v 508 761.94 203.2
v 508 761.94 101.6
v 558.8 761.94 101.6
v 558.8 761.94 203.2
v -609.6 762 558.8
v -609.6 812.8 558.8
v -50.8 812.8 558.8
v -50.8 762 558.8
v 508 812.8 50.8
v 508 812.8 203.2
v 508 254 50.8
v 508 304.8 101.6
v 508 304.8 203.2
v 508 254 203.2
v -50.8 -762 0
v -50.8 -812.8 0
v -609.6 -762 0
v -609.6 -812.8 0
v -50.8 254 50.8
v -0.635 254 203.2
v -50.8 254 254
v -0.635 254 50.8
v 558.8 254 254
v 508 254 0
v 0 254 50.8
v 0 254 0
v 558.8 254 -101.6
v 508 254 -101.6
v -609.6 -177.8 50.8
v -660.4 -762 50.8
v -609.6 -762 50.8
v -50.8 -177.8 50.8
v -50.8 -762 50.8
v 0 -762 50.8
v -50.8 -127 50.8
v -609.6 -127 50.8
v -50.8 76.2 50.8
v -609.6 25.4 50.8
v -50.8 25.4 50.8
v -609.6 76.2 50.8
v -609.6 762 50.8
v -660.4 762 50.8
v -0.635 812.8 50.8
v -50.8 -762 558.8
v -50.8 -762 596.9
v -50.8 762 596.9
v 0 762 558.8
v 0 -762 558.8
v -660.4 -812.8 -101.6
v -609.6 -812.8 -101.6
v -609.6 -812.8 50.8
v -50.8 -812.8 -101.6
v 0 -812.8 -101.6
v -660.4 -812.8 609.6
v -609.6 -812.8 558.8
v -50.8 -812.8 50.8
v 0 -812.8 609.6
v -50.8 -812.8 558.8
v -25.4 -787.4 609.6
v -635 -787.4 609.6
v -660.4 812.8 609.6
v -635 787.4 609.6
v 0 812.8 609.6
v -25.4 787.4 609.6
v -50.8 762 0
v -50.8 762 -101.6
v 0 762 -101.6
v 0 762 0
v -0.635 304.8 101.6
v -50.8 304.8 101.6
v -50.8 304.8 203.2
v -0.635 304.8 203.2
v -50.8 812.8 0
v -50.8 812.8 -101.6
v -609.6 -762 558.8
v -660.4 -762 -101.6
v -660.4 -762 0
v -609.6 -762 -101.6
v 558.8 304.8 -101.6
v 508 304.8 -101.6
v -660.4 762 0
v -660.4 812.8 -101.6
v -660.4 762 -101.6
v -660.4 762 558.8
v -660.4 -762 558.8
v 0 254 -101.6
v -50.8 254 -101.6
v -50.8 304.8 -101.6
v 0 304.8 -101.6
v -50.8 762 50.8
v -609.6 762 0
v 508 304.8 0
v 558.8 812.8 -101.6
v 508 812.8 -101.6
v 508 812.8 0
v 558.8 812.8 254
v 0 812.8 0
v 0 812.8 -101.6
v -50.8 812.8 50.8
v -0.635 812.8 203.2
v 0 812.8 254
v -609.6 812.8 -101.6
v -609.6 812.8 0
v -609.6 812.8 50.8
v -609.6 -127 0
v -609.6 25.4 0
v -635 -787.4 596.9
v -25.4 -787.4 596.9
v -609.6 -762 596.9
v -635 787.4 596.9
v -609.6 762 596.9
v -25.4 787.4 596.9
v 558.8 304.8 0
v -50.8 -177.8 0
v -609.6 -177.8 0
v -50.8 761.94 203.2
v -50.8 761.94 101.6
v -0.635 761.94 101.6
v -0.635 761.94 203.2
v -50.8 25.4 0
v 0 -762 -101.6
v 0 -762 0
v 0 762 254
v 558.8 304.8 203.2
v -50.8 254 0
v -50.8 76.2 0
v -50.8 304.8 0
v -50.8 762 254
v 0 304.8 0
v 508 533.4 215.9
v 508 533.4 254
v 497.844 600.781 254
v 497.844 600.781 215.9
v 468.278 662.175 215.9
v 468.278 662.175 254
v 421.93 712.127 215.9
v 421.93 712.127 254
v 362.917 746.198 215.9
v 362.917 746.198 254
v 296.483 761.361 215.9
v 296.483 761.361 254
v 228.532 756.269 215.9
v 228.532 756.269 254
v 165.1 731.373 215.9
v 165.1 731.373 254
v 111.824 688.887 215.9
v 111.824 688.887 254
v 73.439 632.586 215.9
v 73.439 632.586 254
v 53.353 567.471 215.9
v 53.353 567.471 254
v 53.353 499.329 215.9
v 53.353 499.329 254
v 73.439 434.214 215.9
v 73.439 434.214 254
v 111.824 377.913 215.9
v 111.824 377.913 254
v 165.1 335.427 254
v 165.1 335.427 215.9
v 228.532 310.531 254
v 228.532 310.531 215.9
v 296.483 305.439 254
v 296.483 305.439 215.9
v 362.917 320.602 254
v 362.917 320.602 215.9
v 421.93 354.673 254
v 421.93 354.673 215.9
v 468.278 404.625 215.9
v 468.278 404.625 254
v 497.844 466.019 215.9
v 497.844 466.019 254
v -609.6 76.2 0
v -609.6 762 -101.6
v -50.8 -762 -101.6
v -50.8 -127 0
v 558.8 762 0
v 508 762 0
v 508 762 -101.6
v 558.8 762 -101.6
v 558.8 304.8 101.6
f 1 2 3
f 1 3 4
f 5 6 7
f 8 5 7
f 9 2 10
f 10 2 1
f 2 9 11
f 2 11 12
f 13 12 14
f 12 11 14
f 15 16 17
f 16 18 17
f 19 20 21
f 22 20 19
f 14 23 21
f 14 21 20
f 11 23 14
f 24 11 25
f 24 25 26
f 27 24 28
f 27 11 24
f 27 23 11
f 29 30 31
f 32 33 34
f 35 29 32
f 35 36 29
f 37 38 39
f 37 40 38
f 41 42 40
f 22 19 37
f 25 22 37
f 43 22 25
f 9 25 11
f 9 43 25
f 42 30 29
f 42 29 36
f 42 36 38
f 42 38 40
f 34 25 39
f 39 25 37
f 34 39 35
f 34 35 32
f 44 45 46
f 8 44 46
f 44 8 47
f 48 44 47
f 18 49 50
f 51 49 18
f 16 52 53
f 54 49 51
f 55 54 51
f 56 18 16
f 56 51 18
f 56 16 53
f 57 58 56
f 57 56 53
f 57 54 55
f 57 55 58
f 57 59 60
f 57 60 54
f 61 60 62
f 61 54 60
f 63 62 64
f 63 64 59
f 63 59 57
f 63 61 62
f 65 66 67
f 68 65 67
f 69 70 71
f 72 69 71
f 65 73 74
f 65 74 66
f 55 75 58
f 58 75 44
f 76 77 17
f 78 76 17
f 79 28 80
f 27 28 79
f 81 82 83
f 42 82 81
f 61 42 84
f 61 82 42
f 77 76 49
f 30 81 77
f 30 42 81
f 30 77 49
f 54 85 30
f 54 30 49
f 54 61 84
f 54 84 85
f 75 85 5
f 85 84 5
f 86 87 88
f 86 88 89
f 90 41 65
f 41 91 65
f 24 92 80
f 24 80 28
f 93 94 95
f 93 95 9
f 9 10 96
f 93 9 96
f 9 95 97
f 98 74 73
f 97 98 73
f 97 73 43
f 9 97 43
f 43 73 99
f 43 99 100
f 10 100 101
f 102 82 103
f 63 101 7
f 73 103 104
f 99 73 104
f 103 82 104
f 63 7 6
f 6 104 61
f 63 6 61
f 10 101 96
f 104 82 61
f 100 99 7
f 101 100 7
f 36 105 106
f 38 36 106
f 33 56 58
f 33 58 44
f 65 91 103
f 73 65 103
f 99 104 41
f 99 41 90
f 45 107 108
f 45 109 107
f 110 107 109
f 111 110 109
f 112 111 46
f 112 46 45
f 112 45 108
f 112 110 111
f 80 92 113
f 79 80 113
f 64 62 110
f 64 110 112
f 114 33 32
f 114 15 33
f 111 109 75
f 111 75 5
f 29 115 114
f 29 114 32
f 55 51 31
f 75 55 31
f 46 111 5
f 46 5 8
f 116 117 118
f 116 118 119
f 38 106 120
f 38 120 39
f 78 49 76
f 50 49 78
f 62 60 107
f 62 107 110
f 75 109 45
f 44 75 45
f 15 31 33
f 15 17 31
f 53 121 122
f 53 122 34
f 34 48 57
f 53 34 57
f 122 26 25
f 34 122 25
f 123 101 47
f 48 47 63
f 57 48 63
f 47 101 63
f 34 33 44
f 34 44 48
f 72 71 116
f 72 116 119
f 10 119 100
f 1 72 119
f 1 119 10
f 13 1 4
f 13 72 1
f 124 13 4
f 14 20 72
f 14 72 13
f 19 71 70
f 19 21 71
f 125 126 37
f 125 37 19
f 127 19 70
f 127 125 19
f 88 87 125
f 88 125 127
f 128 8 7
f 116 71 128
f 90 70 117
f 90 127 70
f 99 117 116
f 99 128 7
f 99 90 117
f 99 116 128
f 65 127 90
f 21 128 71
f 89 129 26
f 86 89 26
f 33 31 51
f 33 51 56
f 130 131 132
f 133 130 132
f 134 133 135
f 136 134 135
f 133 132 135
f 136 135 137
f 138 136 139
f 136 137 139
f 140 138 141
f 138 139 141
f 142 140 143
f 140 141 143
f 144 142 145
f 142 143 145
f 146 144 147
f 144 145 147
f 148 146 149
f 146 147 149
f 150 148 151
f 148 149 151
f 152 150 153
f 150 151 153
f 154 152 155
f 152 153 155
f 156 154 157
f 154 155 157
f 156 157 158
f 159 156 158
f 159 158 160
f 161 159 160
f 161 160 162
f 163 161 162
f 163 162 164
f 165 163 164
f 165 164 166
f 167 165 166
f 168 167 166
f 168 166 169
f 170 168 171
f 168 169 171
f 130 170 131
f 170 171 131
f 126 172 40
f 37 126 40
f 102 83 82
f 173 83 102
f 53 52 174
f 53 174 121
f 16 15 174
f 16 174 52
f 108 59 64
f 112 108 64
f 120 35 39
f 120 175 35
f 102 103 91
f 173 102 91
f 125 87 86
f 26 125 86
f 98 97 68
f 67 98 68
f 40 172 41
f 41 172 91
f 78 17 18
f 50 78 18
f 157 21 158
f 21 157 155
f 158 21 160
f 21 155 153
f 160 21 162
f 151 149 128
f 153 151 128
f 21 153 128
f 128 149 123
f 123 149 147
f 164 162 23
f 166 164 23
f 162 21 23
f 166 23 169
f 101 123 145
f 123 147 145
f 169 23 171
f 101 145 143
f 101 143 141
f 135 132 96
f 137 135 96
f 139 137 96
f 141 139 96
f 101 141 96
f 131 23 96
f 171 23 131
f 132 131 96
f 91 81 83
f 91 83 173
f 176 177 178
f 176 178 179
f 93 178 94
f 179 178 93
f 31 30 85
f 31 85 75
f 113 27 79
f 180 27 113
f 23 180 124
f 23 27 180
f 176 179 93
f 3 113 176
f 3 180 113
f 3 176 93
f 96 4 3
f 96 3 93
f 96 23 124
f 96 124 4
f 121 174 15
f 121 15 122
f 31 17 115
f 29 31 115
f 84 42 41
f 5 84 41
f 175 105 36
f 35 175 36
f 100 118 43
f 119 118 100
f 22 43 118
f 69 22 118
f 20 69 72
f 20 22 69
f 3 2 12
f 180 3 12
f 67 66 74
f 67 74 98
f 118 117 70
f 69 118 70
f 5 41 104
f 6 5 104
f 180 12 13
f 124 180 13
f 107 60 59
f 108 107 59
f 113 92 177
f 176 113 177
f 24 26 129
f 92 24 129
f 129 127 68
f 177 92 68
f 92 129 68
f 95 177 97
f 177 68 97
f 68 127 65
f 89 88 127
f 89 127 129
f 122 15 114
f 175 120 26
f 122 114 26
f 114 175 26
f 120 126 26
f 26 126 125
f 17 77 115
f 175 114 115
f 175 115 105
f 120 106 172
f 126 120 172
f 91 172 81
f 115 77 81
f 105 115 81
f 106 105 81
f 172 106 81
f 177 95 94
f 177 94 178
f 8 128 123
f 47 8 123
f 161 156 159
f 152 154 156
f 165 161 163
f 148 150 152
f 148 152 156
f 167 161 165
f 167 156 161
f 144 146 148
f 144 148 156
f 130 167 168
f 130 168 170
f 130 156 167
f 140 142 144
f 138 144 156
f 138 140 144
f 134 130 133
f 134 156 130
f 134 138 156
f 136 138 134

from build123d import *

# Parameters (mm, degrees)
F0_W       = 1320.8
F0_H       = 1625.6
F0_W_2     = 1219.2
F0_H_2     = 1524
F1_DEPTH   = 50.8
F2_W       = 50.8
F2_H       = 50.8
F3_DEPTH   = 508
F4_W       = 1320.8
F4_H       = 1625.6
F4_W_2     = 1219.2
F4_H_2     = 1524
F5_DEPTH   = 50.8
F6_W       = 609.6
F6_H       = 50.8
F7_DEPTH   = 1524
F9_DEPTH   = 609.601
F10_W      = 50.8
F10_H      = 50.8
F11_DEPTH  = 508
F12_W      = 50.8
F12_H      = 50.8
F13_DEPTH  = 1524
F14_W      = 558.8
F14_H      = 254
F15_DEPTH  = 558.8
F15_FACE_W = 508
F15_FACE_H = 203.2
F16_DEPTH  = 50.8
F17_W      = 508.634997
F17_H      = 152.4
F18_DEPTH  = 558.801
F19_W      = 457.139586
F19_H      = 101.6
F20_DEPTH  = 609.601
F21_W      = 609.6
F21_H      = 1574.8
F22_DEPTH  = 12.7
F23_W      = 558.8
F23_H      = 1524
F24_DEPTH  = 596.901
F25_W      = 50.8
F25_H      = 50.8
F26_DEPTH  = 101.6
F27_W      = 50.8
F27_H      = 50.8
F28_DEPTH  = 558.8
F29_R      = 228.6
F30_DEPTH  = 38.1


with BuildPart() as f1:
    # F0 (on Top) → F1 (new body)
    with BuildSketch(Plane.XY):
        Rectangle(F0_W, F0_H)
        Rectangle(F0_W_2, F0_H_2, mode=Mode.SUBTRACT)
    extrude(amount=F1_DEPTH)

    # F2 (on face) → F3 (join)
    with BuildSketch(Plane.XY.offset(50.8)):
        with Locations((-635, 787.4)):
            Rectangle(F2_W, F2_H)
        with Locations((635, 787.4)):
            Rectangle(F2_W, F2_H)
        with Locations((635, -787.4)):
            Rectangle(F2_W, F2_H)
        with Locations((-635, -787.4)):
            Rectangle(F2_W, F2_H)
    extrude(amount=F3_DEPTH)

    # F4 (on face) → F5 (join)
    with BuildSketch(Plane.XY.offset(558.8)):
        Rectangle(F4_W, F4_H)
        Rectangle(F4_W_2, F4_H_2, mode=Mode.SUBTRACT)
    extrude(amount=F5_DEPTH)

    # F6 (on face) → F7 (join, through all)
    with BuildSketch(Plane.XZ.offset(-762)):
        with Locations((-304.8, 584.2)):
            Rectangle(F6_W, F6_H)
    extrude(amount=F7_DEPTH)

    # F8 (on face) → F9 (cut, through all)
    with BuildSketch(Plane.XY.offset(609.6)):
        Polygon((0, 812.8), (0, 762), (0, -812.8), (660.4, -812.8), (660.4, 812.8), align=None)
    extrude(amount=-F9_DEPTH, mode=Mode.SUBTRACT)

    # F10 (on face) → F11 (join, through all)
    with BuildSketch(Plane.XY.offset(50.8)):
        with Locations((-25.4, 787.4)):
            Rectangle(F10_W, F10_H)
        with Locations((-25.4, -787.4)):
            Rectangle(F10_W, F10_H)
    extrude(amount=F11_DEPTH)

    # F12 (on face) → F13 (join, through all)
    with BuildSketch(Plane.XZ.offset(-762)):
        with Locations((-25.4, 25.4)):
            Rectangle(F12_W, F12_H)
    extrude(amount=F13_DEPTH)

    # F14 (on face) → F15 (join)
    with BuildSketch(Plane.YZ):
        with Locations((533.4, 127)):
            Rectangle(F14_W, F14_H)
    extrude(amount=F15_DEPTH)

    # F15_face (on face) → F16 (join)
    with BuildSketch(Plane(origin=(0, 508, 152.4), x_dir=(0, 1, 0), z_dir=(-1, 0, 0))):
        Rectangle(F15_FACE_W, F15_FACE_H)
    extrude(amount=F16_DEPTH)

    # F17 (on face) → F18 (cut, through all)
    with BuildSketch(Plane.XZ.offset(-254)):
        with Locations((253.682502, 127)):
            Rectangle(F17_W, F17_H)
    extrude(amount=-F18_DEPTH, mode=Mode.SUBTRACT)

    # F19 (on face) → F20 (cut, through all)
    with BuildSketch(Plane(origin=(-50.8, 0, 0), x_dir=(0, -1, 0), z_dir=(-1, 0, 0))):
        with Locations((-533.369793, 152.4)):
            Rectangle(F19_W, F19_H)
    extrude(amount=-F20_DEPTH, mode=Mode.SUBTRACT)

    # F21 (on face) → F22 (cut)
    with BuildSketch(Plane.XY.offset(609.6)):
        with Locations((-330.2, 0)):
            Rectangle(F21_W, F21_H)
    extrude(amount=-F22_DEPTH, mode=Mode.SUBTRACT)

    # F23 (on face) → F24 (cut, through all)
    with BuildSketch(Plane.XY.offset(596.9)):
        with Locations((-330.2, 0)):
            Rectangle(F23_W, F23_H)
    extrude(amount=-F24_DEPTH, mode=Mode.SUBTRACT)

    # F25 (on face) → F26 (join)
    with BuildSketch(Plane(origin=(0, 0, 0), x_dir=(1, 0, 0), z_dir=(0, 0, -1))):
        with Locations((-635, 787.4)):
            Rectangle(F25_W, F25_H)
        with Locations((-25.4, 787.4)):
            Rectangle(F25_W, F25_H)
        with Locations((-635, -787.4)):
            Rectangle(F25_W, F25_H)
        with Locations((-25.4, -787.4)):
            Rectangle(F25_W, F25_H)
        with Locations((-25.4, -279.4)):
            Rectangle(F25_W, F25_H)
        with Locations((533.4, -279.4)):
            Rectangle(F25_W, F25_H)
        with Locations((533.4, -787.4)):
            Rectangle(F25_W, F25_H)
    extrude(amount=F26_DEPTH)

    # F27 (on face) → F28 (join, through all)
    with BuildSketch(Plane.YZ.offset(-609.6)):
        with Locations((-152.4, 25.4)):
            Rectangle(F27_W, F27_H)
        with Locations((50.8, 25.4)):
            Rectangle(F27_W, F27_H)
    extrude(amount=F28_DEPTH)

    # F29 (on face) → F30 (cut)
    with BuildSketch(Plane.XY.offset(254)):
        with Locations((279.4, 533.4)):
            Circle(F29_R)
    extrude(amount=-F30_DEPTH, mode=Mode.SUBTRACT)


solid = f1.part
